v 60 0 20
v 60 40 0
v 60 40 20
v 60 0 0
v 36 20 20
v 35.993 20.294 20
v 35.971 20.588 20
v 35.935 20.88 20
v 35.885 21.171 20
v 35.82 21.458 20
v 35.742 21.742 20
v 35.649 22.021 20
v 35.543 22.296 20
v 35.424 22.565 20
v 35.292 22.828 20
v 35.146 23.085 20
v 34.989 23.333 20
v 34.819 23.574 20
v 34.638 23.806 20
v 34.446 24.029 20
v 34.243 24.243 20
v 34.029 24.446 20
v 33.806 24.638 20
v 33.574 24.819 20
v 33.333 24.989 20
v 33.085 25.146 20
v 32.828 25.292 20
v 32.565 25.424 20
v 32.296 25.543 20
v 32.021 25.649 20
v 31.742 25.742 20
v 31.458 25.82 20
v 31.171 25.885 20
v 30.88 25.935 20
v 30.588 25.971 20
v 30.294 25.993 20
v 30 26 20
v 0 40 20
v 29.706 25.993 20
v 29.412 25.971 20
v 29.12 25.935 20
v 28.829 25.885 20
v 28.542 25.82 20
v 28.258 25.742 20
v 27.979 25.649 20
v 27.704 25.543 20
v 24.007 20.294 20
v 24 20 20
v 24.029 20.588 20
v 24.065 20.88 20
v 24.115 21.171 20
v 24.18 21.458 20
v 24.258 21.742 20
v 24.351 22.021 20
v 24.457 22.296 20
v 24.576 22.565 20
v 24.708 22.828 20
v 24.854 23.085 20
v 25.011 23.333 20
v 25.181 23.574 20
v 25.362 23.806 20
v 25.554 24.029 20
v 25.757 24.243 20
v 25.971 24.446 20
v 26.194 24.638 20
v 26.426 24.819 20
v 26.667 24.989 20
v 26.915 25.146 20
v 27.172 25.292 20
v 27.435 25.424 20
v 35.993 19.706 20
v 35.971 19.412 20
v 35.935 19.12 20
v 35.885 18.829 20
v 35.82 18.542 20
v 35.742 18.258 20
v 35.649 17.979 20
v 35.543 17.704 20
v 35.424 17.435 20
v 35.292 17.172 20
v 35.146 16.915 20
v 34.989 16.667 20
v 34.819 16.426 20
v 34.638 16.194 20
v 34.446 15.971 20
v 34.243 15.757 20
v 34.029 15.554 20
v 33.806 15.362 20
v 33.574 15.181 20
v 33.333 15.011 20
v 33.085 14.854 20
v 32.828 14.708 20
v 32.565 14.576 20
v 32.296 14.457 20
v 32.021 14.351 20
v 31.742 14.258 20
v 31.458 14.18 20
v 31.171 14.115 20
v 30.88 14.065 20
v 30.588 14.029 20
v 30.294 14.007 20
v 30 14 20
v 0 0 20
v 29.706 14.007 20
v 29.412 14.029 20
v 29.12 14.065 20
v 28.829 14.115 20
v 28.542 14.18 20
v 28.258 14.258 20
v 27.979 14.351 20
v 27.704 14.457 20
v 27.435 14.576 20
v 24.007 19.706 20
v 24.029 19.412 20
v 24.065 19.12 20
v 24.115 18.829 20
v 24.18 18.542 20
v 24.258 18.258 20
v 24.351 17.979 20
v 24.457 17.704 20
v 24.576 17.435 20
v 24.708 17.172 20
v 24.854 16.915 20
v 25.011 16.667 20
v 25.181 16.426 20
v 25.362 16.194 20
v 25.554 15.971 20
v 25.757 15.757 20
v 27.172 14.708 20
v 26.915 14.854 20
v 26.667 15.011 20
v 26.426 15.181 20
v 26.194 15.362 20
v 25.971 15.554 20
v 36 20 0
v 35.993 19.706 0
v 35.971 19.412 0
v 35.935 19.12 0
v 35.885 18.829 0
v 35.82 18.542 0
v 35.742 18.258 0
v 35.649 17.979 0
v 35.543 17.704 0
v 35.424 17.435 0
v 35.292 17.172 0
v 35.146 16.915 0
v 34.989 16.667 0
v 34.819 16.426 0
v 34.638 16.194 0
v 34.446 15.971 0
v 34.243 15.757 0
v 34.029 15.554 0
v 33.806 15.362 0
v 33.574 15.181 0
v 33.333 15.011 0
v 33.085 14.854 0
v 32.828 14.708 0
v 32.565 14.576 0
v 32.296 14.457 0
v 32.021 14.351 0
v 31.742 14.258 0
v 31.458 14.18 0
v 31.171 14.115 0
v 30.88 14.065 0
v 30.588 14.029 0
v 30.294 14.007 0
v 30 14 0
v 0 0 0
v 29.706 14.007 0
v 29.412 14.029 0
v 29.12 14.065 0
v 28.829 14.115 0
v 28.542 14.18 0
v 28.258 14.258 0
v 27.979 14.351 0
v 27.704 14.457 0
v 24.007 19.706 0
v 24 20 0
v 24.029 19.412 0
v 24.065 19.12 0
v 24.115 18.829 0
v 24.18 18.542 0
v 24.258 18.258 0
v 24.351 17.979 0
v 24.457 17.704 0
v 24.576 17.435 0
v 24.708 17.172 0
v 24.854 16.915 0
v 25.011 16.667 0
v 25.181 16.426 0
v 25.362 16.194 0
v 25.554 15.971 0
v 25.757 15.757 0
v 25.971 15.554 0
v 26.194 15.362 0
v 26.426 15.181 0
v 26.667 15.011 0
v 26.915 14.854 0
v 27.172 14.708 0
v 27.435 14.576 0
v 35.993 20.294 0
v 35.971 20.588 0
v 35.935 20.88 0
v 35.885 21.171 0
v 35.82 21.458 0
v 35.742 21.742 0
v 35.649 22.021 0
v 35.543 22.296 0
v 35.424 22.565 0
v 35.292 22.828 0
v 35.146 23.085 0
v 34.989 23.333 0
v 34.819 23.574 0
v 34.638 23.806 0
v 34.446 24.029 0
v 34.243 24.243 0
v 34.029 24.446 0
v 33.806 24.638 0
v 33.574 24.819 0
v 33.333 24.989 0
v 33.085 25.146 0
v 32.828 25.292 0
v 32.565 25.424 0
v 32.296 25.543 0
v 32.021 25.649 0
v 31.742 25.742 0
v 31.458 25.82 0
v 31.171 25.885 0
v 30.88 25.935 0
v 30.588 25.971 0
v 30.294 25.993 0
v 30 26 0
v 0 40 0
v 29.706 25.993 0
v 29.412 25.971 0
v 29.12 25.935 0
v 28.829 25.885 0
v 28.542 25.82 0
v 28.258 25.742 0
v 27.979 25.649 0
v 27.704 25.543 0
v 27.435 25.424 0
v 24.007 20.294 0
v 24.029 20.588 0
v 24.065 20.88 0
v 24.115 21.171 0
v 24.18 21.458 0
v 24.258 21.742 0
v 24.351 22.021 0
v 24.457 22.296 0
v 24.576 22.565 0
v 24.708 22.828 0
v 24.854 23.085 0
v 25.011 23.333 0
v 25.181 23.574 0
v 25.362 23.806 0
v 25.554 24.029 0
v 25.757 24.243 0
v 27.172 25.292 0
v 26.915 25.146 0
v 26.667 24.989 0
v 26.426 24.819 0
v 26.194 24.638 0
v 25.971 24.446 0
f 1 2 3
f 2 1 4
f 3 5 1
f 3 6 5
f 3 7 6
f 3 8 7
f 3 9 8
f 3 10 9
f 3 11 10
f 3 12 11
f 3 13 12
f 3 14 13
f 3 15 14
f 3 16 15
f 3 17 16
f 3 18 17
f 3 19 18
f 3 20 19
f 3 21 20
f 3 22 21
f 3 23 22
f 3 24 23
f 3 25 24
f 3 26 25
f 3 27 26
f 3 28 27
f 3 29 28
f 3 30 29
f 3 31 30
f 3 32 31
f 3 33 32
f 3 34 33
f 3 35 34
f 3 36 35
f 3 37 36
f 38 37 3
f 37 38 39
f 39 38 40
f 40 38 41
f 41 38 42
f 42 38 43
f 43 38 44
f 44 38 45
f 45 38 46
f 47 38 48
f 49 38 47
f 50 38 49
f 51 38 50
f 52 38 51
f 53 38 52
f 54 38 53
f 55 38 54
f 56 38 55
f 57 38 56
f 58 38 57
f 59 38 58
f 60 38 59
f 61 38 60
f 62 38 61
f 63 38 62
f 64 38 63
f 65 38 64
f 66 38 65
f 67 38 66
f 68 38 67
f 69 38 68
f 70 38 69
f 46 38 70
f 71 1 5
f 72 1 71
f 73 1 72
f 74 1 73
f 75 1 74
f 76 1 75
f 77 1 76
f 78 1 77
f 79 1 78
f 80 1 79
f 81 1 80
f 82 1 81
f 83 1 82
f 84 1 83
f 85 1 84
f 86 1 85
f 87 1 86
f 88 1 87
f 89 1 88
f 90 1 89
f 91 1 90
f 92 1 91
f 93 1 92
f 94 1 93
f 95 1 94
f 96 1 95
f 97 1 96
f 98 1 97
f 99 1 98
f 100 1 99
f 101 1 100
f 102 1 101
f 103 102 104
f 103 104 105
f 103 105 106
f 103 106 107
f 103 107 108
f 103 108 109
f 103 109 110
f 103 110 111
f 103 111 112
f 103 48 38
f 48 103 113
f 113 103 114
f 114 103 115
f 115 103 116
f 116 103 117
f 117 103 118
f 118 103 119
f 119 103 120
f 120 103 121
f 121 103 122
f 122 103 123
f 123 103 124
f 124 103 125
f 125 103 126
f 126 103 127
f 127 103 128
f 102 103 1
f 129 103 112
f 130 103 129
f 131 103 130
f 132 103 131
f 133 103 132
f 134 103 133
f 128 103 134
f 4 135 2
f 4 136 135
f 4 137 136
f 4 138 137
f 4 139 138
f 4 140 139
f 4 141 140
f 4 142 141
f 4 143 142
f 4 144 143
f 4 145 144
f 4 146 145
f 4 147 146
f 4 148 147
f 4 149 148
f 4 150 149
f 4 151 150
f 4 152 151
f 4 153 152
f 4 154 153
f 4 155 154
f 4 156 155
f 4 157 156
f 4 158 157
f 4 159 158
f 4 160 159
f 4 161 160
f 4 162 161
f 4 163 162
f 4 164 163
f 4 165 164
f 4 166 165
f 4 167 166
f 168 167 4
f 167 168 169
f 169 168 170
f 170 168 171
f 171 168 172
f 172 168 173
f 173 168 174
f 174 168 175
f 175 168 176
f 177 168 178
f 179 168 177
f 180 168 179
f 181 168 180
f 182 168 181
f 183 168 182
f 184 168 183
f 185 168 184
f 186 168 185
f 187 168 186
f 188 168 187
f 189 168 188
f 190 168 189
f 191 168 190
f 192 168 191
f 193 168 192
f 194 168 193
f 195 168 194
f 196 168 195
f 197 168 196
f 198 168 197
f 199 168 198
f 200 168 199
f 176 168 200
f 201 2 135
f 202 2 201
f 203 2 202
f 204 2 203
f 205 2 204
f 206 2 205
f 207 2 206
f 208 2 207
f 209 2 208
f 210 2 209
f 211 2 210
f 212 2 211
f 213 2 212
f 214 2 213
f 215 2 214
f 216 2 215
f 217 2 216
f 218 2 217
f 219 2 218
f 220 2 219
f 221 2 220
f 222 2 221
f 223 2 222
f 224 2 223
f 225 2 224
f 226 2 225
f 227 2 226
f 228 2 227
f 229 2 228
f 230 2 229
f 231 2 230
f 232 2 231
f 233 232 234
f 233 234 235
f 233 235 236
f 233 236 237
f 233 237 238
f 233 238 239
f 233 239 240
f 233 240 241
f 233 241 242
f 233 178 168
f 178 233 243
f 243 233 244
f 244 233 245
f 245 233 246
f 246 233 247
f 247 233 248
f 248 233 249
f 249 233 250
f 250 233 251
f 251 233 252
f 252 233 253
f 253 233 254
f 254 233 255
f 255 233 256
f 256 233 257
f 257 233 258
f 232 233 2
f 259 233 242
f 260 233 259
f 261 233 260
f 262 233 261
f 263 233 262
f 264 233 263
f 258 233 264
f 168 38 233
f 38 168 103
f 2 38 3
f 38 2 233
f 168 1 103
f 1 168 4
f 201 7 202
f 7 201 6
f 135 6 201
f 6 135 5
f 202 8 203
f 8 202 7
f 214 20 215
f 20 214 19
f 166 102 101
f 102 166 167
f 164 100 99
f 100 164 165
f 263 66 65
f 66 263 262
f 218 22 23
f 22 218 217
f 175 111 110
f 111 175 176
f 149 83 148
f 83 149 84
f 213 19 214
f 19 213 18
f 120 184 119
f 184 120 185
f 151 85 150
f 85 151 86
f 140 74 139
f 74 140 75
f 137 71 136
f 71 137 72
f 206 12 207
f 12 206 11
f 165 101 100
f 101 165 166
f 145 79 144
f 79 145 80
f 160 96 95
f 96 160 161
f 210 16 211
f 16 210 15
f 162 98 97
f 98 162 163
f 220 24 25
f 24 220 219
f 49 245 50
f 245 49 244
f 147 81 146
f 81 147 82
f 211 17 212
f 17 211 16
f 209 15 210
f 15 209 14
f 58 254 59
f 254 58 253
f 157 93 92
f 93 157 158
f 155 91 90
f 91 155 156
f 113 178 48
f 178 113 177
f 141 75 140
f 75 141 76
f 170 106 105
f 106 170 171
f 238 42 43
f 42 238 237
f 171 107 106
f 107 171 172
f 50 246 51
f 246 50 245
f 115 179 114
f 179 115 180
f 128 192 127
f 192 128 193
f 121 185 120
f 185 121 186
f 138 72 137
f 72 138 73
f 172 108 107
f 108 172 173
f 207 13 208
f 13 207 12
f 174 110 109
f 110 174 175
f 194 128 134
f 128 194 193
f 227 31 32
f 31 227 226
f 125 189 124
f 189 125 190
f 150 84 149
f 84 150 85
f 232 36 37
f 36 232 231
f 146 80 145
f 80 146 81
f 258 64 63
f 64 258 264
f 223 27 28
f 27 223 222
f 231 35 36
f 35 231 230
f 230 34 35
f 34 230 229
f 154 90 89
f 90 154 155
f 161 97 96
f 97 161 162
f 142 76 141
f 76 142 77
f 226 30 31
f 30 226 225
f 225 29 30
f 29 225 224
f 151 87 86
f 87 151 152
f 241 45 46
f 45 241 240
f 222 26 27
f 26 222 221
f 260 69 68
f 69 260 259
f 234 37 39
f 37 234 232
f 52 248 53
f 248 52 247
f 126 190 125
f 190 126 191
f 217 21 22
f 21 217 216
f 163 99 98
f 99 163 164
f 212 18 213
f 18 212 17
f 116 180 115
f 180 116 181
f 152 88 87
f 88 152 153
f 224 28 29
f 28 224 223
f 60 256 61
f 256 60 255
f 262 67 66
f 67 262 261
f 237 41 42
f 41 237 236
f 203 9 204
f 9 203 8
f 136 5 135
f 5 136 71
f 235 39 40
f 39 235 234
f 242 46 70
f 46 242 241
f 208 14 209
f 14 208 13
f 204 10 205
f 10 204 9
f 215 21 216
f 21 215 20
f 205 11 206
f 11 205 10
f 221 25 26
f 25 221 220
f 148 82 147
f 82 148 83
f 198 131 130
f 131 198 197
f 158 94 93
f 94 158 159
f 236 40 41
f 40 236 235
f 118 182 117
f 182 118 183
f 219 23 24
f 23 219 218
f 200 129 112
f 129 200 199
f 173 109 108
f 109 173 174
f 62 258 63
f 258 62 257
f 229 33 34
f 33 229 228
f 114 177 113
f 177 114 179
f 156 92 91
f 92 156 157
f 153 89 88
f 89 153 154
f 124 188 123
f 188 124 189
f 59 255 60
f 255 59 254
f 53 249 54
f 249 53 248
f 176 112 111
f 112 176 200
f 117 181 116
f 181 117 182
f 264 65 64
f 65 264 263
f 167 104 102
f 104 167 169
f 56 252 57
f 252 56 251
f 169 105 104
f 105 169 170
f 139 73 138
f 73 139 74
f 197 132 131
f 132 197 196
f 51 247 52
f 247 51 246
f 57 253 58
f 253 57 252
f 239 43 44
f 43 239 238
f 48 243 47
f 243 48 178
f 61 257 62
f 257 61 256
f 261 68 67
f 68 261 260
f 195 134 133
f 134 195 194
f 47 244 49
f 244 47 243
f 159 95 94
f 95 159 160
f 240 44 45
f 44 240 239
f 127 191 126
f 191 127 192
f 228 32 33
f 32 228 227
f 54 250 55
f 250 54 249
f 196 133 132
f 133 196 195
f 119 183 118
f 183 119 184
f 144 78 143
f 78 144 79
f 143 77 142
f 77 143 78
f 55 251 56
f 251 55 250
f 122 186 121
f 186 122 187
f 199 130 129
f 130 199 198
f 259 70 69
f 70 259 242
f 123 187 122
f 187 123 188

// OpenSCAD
// 60 x 40 x 20 mm block with a 12 mm hole through its 20 mm height, centred.
difference() {
  cube([60, 40, 20]);
  translate([30, 20, -1]) cylinder(d = 12, h = 22, $fn = 128);
}
